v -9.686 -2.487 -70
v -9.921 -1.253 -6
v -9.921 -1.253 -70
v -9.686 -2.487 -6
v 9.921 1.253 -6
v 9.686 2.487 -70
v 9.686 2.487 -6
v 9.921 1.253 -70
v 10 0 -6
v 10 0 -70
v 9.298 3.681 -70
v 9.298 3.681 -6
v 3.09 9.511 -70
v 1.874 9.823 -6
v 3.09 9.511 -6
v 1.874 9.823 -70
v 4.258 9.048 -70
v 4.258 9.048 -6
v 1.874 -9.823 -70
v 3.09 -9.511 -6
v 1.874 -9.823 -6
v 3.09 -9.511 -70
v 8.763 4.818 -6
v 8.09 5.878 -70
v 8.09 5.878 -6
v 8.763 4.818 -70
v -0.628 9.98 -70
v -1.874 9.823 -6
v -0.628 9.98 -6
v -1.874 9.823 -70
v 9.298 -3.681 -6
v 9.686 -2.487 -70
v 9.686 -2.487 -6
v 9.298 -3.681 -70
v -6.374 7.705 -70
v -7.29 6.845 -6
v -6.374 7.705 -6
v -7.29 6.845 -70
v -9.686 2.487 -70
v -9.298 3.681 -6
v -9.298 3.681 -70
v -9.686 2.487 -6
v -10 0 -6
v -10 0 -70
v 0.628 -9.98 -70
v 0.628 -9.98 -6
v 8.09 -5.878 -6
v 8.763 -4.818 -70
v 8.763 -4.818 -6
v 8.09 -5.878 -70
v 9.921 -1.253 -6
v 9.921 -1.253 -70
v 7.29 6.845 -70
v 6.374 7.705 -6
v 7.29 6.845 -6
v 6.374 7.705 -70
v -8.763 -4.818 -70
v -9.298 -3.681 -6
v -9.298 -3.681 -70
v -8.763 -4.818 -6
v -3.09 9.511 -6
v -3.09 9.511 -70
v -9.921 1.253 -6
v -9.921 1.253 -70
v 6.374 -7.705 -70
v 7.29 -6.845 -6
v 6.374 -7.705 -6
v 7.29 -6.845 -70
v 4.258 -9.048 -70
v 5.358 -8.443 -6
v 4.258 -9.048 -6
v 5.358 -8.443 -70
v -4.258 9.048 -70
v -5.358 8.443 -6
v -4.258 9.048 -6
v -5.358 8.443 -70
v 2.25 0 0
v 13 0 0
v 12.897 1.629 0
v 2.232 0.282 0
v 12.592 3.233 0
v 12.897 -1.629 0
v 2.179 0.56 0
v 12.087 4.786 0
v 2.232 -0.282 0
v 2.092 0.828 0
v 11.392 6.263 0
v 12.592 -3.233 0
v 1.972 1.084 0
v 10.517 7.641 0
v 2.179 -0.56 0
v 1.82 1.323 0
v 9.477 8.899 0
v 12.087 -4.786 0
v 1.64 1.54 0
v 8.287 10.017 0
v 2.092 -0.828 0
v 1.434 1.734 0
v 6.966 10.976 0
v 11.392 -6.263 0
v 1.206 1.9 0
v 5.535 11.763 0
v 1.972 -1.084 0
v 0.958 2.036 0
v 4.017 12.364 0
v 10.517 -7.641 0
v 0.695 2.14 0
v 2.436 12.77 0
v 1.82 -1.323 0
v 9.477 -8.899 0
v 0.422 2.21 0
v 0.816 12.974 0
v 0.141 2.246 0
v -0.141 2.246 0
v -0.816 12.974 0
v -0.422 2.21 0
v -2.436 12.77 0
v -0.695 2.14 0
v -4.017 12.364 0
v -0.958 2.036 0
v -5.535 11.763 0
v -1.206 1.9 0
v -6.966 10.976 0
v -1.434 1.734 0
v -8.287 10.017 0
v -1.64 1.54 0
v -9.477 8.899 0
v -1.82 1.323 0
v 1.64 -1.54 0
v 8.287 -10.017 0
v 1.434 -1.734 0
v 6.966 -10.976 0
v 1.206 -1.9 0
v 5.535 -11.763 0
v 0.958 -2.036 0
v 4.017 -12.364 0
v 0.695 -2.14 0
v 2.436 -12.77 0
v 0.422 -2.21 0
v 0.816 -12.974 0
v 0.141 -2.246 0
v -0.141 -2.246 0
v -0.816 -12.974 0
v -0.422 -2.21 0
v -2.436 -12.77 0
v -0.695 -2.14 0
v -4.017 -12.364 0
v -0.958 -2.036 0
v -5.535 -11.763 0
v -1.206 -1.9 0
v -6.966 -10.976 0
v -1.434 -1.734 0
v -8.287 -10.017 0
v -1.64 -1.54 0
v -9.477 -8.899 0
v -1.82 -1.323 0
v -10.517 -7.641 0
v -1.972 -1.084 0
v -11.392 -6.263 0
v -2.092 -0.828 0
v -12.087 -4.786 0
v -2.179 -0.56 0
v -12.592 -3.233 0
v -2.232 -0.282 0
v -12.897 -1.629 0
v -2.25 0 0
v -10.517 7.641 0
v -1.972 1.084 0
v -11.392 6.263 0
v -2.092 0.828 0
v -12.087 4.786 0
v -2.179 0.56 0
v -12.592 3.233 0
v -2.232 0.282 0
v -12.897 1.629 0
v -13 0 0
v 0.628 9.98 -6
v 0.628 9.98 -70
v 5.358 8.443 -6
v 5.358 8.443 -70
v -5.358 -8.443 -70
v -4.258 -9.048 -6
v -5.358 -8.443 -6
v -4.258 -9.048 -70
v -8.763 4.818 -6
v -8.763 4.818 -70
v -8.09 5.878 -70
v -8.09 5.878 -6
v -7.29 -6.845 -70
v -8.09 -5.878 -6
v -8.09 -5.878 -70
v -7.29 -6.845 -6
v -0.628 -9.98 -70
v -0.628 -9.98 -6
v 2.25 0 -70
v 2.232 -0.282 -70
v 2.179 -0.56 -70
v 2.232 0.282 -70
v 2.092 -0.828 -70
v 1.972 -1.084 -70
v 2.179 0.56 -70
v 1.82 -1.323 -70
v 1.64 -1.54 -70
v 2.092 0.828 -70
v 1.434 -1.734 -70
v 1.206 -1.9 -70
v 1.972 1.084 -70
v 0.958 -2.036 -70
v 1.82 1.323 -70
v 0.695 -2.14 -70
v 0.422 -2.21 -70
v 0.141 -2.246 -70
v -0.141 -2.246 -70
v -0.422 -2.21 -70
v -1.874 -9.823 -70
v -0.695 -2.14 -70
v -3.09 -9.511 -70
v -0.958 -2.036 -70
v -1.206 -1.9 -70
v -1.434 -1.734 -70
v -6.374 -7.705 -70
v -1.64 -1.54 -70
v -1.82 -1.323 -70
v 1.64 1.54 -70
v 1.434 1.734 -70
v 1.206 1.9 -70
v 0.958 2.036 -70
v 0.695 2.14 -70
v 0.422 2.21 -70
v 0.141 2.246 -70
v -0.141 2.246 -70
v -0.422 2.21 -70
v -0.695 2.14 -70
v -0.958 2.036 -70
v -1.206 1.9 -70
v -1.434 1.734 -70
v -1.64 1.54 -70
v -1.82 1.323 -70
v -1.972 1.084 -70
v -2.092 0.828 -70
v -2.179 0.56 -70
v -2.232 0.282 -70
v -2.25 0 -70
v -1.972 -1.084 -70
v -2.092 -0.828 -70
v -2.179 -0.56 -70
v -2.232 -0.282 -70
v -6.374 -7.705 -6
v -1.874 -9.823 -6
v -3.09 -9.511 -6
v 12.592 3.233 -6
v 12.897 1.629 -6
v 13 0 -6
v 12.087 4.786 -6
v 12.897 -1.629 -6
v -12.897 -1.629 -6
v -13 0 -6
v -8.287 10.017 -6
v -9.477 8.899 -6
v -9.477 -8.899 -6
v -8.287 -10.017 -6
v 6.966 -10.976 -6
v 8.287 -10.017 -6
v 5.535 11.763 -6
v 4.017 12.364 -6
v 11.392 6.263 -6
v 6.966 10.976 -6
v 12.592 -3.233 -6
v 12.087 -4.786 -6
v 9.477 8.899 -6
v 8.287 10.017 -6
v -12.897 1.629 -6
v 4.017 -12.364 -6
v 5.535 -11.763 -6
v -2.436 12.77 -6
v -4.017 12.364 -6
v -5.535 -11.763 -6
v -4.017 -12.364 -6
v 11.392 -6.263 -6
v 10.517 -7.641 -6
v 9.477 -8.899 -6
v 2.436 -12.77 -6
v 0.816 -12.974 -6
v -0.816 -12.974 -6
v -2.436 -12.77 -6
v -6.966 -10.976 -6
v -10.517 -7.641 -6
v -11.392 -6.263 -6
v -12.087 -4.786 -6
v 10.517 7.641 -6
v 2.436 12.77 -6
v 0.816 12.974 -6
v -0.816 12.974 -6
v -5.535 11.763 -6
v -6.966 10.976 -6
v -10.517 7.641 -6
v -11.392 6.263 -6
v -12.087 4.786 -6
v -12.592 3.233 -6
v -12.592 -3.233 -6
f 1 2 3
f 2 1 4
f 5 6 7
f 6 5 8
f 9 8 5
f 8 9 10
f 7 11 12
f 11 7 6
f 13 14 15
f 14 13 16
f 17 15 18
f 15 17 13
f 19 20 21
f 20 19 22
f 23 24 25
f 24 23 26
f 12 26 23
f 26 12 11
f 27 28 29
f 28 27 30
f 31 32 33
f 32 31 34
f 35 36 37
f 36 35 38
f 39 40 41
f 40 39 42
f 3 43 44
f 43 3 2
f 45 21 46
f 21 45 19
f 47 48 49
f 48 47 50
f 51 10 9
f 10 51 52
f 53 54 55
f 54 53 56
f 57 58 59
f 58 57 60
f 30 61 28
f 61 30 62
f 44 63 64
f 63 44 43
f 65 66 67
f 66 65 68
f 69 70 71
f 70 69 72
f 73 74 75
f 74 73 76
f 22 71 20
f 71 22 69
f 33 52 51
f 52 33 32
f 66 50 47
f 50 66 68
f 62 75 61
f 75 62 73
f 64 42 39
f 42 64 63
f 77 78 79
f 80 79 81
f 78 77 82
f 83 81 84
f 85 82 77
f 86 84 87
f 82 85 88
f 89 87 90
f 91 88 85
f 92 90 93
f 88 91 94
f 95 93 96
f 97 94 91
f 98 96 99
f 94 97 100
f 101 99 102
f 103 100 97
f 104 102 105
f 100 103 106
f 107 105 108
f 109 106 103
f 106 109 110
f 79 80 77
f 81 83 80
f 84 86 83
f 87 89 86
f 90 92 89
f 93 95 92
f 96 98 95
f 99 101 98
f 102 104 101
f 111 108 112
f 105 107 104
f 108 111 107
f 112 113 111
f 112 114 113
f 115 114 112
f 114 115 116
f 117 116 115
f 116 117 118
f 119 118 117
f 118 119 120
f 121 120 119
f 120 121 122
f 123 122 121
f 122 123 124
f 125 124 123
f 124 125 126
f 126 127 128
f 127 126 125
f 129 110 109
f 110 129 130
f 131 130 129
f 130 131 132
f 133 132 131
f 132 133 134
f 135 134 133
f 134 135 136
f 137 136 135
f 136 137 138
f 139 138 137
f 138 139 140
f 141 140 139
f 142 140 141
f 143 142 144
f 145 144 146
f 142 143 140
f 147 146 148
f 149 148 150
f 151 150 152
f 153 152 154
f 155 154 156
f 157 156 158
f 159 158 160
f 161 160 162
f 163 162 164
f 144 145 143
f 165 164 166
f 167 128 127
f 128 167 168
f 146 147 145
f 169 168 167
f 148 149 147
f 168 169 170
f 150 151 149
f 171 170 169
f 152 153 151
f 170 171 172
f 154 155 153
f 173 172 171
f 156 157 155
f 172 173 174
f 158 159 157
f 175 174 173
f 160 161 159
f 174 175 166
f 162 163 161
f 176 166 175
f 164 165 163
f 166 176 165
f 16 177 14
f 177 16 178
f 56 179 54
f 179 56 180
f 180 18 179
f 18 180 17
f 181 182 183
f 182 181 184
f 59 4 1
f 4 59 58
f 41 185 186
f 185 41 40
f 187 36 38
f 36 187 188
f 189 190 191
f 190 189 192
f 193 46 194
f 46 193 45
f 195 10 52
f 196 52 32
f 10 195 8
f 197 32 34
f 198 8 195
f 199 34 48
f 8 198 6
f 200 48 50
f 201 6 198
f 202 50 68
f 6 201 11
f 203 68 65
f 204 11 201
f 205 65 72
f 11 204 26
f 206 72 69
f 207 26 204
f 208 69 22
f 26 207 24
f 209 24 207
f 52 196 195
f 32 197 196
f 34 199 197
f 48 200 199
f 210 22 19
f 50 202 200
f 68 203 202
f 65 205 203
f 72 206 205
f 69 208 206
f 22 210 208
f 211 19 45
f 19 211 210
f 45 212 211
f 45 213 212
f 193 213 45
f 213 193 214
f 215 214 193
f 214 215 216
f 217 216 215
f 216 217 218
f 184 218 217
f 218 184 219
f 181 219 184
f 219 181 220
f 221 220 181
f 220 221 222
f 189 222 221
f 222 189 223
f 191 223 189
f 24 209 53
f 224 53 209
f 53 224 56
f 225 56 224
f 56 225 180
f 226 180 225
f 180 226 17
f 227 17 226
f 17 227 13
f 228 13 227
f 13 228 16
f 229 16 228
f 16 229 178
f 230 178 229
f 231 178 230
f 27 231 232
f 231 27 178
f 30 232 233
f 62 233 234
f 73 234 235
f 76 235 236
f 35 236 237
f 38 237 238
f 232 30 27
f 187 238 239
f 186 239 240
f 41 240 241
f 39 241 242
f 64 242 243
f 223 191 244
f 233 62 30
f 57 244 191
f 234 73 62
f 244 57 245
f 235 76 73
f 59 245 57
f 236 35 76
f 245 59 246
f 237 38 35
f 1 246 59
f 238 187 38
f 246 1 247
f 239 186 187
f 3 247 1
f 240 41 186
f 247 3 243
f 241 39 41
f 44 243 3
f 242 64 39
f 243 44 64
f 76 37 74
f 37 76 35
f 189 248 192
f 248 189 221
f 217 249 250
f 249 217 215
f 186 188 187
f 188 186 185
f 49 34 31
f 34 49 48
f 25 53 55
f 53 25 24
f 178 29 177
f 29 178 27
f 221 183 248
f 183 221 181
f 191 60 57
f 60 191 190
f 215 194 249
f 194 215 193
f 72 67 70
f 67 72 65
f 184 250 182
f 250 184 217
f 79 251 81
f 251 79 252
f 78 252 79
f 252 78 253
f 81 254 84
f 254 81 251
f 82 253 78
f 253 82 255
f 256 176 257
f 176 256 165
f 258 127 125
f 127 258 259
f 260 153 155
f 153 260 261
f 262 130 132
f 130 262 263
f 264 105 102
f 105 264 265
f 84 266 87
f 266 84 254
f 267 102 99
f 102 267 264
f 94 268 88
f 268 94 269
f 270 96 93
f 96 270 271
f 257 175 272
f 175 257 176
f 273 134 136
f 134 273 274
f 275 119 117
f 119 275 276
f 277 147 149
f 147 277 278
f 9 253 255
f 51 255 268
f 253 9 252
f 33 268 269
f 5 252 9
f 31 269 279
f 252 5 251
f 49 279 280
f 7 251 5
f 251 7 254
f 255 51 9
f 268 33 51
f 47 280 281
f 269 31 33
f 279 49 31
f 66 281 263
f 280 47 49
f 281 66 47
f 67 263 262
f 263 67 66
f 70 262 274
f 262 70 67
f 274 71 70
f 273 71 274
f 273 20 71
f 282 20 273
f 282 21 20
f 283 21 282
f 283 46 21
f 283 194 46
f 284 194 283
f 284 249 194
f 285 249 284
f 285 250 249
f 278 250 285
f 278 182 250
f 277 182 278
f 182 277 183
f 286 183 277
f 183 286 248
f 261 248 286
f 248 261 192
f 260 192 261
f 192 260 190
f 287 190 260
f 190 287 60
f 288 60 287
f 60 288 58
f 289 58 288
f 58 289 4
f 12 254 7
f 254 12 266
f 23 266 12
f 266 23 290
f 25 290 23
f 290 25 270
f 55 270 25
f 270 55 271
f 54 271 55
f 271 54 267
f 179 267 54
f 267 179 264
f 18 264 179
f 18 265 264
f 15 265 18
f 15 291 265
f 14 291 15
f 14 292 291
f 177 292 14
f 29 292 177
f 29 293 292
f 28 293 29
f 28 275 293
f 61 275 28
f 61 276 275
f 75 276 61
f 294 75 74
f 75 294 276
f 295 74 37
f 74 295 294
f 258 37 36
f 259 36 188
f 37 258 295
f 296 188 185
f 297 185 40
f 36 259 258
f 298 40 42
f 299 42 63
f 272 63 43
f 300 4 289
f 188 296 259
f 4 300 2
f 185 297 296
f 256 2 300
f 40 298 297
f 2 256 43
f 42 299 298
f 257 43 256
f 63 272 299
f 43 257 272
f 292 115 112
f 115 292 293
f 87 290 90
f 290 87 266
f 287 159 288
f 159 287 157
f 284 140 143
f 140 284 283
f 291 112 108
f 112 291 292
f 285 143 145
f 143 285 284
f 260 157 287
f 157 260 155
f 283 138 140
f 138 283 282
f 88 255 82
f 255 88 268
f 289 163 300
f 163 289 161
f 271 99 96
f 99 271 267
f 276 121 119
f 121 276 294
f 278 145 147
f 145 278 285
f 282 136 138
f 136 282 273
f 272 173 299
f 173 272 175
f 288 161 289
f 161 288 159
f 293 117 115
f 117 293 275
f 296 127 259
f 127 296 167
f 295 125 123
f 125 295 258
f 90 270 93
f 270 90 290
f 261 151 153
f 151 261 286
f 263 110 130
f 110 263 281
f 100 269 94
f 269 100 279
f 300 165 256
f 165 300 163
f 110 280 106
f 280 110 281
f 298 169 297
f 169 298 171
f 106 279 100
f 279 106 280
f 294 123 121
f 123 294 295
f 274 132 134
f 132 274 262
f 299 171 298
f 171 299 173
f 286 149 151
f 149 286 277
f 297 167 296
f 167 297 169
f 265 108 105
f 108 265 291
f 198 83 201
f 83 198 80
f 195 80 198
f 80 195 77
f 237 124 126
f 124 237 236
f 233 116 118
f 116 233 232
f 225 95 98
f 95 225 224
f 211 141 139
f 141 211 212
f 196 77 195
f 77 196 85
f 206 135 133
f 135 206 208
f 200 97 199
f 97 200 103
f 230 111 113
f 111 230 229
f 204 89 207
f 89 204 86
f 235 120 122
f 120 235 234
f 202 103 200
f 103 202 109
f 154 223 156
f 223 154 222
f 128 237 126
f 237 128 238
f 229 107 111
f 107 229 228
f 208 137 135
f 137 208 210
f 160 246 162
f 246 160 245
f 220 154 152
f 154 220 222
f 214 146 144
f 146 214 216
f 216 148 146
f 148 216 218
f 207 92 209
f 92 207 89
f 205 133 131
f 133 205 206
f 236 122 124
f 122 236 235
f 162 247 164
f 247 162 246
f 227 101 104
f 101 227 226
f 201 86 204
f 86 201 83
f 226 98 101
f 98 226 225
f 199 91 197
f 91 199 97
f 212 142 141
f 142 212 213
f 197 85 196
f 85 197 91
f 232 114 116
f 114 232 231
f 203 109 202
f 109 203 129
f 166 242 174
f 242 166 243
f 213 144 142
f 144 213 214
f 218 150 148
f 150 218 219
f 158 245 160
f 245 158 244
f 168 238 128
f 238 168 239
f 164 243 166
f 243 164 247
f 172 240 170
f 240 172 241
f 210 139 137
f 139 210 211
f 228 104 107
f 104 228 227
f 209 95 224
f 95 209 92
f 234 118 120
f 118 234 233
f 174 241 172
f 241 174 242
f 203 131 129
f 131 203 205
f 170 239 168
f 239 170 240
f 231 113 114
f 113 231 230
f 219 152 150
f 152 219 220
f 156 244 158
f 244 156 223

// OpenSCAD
$fn = 50;


difference() {
	union() {
		translate(v = [0, 0, -70.0000000000]) {
			cylinder(h = 70, r = 10.0000000000);
		}
		translate(v = [0, 0, -6.0000000000]) {
			cylinder(h = 6, r = 13.0000000000);
		}
	}
	union() {
		#translate(v = [0, 0, -70]) {
			cylinder(h = 70, r = 2.2500000000);
		}
	}
}
